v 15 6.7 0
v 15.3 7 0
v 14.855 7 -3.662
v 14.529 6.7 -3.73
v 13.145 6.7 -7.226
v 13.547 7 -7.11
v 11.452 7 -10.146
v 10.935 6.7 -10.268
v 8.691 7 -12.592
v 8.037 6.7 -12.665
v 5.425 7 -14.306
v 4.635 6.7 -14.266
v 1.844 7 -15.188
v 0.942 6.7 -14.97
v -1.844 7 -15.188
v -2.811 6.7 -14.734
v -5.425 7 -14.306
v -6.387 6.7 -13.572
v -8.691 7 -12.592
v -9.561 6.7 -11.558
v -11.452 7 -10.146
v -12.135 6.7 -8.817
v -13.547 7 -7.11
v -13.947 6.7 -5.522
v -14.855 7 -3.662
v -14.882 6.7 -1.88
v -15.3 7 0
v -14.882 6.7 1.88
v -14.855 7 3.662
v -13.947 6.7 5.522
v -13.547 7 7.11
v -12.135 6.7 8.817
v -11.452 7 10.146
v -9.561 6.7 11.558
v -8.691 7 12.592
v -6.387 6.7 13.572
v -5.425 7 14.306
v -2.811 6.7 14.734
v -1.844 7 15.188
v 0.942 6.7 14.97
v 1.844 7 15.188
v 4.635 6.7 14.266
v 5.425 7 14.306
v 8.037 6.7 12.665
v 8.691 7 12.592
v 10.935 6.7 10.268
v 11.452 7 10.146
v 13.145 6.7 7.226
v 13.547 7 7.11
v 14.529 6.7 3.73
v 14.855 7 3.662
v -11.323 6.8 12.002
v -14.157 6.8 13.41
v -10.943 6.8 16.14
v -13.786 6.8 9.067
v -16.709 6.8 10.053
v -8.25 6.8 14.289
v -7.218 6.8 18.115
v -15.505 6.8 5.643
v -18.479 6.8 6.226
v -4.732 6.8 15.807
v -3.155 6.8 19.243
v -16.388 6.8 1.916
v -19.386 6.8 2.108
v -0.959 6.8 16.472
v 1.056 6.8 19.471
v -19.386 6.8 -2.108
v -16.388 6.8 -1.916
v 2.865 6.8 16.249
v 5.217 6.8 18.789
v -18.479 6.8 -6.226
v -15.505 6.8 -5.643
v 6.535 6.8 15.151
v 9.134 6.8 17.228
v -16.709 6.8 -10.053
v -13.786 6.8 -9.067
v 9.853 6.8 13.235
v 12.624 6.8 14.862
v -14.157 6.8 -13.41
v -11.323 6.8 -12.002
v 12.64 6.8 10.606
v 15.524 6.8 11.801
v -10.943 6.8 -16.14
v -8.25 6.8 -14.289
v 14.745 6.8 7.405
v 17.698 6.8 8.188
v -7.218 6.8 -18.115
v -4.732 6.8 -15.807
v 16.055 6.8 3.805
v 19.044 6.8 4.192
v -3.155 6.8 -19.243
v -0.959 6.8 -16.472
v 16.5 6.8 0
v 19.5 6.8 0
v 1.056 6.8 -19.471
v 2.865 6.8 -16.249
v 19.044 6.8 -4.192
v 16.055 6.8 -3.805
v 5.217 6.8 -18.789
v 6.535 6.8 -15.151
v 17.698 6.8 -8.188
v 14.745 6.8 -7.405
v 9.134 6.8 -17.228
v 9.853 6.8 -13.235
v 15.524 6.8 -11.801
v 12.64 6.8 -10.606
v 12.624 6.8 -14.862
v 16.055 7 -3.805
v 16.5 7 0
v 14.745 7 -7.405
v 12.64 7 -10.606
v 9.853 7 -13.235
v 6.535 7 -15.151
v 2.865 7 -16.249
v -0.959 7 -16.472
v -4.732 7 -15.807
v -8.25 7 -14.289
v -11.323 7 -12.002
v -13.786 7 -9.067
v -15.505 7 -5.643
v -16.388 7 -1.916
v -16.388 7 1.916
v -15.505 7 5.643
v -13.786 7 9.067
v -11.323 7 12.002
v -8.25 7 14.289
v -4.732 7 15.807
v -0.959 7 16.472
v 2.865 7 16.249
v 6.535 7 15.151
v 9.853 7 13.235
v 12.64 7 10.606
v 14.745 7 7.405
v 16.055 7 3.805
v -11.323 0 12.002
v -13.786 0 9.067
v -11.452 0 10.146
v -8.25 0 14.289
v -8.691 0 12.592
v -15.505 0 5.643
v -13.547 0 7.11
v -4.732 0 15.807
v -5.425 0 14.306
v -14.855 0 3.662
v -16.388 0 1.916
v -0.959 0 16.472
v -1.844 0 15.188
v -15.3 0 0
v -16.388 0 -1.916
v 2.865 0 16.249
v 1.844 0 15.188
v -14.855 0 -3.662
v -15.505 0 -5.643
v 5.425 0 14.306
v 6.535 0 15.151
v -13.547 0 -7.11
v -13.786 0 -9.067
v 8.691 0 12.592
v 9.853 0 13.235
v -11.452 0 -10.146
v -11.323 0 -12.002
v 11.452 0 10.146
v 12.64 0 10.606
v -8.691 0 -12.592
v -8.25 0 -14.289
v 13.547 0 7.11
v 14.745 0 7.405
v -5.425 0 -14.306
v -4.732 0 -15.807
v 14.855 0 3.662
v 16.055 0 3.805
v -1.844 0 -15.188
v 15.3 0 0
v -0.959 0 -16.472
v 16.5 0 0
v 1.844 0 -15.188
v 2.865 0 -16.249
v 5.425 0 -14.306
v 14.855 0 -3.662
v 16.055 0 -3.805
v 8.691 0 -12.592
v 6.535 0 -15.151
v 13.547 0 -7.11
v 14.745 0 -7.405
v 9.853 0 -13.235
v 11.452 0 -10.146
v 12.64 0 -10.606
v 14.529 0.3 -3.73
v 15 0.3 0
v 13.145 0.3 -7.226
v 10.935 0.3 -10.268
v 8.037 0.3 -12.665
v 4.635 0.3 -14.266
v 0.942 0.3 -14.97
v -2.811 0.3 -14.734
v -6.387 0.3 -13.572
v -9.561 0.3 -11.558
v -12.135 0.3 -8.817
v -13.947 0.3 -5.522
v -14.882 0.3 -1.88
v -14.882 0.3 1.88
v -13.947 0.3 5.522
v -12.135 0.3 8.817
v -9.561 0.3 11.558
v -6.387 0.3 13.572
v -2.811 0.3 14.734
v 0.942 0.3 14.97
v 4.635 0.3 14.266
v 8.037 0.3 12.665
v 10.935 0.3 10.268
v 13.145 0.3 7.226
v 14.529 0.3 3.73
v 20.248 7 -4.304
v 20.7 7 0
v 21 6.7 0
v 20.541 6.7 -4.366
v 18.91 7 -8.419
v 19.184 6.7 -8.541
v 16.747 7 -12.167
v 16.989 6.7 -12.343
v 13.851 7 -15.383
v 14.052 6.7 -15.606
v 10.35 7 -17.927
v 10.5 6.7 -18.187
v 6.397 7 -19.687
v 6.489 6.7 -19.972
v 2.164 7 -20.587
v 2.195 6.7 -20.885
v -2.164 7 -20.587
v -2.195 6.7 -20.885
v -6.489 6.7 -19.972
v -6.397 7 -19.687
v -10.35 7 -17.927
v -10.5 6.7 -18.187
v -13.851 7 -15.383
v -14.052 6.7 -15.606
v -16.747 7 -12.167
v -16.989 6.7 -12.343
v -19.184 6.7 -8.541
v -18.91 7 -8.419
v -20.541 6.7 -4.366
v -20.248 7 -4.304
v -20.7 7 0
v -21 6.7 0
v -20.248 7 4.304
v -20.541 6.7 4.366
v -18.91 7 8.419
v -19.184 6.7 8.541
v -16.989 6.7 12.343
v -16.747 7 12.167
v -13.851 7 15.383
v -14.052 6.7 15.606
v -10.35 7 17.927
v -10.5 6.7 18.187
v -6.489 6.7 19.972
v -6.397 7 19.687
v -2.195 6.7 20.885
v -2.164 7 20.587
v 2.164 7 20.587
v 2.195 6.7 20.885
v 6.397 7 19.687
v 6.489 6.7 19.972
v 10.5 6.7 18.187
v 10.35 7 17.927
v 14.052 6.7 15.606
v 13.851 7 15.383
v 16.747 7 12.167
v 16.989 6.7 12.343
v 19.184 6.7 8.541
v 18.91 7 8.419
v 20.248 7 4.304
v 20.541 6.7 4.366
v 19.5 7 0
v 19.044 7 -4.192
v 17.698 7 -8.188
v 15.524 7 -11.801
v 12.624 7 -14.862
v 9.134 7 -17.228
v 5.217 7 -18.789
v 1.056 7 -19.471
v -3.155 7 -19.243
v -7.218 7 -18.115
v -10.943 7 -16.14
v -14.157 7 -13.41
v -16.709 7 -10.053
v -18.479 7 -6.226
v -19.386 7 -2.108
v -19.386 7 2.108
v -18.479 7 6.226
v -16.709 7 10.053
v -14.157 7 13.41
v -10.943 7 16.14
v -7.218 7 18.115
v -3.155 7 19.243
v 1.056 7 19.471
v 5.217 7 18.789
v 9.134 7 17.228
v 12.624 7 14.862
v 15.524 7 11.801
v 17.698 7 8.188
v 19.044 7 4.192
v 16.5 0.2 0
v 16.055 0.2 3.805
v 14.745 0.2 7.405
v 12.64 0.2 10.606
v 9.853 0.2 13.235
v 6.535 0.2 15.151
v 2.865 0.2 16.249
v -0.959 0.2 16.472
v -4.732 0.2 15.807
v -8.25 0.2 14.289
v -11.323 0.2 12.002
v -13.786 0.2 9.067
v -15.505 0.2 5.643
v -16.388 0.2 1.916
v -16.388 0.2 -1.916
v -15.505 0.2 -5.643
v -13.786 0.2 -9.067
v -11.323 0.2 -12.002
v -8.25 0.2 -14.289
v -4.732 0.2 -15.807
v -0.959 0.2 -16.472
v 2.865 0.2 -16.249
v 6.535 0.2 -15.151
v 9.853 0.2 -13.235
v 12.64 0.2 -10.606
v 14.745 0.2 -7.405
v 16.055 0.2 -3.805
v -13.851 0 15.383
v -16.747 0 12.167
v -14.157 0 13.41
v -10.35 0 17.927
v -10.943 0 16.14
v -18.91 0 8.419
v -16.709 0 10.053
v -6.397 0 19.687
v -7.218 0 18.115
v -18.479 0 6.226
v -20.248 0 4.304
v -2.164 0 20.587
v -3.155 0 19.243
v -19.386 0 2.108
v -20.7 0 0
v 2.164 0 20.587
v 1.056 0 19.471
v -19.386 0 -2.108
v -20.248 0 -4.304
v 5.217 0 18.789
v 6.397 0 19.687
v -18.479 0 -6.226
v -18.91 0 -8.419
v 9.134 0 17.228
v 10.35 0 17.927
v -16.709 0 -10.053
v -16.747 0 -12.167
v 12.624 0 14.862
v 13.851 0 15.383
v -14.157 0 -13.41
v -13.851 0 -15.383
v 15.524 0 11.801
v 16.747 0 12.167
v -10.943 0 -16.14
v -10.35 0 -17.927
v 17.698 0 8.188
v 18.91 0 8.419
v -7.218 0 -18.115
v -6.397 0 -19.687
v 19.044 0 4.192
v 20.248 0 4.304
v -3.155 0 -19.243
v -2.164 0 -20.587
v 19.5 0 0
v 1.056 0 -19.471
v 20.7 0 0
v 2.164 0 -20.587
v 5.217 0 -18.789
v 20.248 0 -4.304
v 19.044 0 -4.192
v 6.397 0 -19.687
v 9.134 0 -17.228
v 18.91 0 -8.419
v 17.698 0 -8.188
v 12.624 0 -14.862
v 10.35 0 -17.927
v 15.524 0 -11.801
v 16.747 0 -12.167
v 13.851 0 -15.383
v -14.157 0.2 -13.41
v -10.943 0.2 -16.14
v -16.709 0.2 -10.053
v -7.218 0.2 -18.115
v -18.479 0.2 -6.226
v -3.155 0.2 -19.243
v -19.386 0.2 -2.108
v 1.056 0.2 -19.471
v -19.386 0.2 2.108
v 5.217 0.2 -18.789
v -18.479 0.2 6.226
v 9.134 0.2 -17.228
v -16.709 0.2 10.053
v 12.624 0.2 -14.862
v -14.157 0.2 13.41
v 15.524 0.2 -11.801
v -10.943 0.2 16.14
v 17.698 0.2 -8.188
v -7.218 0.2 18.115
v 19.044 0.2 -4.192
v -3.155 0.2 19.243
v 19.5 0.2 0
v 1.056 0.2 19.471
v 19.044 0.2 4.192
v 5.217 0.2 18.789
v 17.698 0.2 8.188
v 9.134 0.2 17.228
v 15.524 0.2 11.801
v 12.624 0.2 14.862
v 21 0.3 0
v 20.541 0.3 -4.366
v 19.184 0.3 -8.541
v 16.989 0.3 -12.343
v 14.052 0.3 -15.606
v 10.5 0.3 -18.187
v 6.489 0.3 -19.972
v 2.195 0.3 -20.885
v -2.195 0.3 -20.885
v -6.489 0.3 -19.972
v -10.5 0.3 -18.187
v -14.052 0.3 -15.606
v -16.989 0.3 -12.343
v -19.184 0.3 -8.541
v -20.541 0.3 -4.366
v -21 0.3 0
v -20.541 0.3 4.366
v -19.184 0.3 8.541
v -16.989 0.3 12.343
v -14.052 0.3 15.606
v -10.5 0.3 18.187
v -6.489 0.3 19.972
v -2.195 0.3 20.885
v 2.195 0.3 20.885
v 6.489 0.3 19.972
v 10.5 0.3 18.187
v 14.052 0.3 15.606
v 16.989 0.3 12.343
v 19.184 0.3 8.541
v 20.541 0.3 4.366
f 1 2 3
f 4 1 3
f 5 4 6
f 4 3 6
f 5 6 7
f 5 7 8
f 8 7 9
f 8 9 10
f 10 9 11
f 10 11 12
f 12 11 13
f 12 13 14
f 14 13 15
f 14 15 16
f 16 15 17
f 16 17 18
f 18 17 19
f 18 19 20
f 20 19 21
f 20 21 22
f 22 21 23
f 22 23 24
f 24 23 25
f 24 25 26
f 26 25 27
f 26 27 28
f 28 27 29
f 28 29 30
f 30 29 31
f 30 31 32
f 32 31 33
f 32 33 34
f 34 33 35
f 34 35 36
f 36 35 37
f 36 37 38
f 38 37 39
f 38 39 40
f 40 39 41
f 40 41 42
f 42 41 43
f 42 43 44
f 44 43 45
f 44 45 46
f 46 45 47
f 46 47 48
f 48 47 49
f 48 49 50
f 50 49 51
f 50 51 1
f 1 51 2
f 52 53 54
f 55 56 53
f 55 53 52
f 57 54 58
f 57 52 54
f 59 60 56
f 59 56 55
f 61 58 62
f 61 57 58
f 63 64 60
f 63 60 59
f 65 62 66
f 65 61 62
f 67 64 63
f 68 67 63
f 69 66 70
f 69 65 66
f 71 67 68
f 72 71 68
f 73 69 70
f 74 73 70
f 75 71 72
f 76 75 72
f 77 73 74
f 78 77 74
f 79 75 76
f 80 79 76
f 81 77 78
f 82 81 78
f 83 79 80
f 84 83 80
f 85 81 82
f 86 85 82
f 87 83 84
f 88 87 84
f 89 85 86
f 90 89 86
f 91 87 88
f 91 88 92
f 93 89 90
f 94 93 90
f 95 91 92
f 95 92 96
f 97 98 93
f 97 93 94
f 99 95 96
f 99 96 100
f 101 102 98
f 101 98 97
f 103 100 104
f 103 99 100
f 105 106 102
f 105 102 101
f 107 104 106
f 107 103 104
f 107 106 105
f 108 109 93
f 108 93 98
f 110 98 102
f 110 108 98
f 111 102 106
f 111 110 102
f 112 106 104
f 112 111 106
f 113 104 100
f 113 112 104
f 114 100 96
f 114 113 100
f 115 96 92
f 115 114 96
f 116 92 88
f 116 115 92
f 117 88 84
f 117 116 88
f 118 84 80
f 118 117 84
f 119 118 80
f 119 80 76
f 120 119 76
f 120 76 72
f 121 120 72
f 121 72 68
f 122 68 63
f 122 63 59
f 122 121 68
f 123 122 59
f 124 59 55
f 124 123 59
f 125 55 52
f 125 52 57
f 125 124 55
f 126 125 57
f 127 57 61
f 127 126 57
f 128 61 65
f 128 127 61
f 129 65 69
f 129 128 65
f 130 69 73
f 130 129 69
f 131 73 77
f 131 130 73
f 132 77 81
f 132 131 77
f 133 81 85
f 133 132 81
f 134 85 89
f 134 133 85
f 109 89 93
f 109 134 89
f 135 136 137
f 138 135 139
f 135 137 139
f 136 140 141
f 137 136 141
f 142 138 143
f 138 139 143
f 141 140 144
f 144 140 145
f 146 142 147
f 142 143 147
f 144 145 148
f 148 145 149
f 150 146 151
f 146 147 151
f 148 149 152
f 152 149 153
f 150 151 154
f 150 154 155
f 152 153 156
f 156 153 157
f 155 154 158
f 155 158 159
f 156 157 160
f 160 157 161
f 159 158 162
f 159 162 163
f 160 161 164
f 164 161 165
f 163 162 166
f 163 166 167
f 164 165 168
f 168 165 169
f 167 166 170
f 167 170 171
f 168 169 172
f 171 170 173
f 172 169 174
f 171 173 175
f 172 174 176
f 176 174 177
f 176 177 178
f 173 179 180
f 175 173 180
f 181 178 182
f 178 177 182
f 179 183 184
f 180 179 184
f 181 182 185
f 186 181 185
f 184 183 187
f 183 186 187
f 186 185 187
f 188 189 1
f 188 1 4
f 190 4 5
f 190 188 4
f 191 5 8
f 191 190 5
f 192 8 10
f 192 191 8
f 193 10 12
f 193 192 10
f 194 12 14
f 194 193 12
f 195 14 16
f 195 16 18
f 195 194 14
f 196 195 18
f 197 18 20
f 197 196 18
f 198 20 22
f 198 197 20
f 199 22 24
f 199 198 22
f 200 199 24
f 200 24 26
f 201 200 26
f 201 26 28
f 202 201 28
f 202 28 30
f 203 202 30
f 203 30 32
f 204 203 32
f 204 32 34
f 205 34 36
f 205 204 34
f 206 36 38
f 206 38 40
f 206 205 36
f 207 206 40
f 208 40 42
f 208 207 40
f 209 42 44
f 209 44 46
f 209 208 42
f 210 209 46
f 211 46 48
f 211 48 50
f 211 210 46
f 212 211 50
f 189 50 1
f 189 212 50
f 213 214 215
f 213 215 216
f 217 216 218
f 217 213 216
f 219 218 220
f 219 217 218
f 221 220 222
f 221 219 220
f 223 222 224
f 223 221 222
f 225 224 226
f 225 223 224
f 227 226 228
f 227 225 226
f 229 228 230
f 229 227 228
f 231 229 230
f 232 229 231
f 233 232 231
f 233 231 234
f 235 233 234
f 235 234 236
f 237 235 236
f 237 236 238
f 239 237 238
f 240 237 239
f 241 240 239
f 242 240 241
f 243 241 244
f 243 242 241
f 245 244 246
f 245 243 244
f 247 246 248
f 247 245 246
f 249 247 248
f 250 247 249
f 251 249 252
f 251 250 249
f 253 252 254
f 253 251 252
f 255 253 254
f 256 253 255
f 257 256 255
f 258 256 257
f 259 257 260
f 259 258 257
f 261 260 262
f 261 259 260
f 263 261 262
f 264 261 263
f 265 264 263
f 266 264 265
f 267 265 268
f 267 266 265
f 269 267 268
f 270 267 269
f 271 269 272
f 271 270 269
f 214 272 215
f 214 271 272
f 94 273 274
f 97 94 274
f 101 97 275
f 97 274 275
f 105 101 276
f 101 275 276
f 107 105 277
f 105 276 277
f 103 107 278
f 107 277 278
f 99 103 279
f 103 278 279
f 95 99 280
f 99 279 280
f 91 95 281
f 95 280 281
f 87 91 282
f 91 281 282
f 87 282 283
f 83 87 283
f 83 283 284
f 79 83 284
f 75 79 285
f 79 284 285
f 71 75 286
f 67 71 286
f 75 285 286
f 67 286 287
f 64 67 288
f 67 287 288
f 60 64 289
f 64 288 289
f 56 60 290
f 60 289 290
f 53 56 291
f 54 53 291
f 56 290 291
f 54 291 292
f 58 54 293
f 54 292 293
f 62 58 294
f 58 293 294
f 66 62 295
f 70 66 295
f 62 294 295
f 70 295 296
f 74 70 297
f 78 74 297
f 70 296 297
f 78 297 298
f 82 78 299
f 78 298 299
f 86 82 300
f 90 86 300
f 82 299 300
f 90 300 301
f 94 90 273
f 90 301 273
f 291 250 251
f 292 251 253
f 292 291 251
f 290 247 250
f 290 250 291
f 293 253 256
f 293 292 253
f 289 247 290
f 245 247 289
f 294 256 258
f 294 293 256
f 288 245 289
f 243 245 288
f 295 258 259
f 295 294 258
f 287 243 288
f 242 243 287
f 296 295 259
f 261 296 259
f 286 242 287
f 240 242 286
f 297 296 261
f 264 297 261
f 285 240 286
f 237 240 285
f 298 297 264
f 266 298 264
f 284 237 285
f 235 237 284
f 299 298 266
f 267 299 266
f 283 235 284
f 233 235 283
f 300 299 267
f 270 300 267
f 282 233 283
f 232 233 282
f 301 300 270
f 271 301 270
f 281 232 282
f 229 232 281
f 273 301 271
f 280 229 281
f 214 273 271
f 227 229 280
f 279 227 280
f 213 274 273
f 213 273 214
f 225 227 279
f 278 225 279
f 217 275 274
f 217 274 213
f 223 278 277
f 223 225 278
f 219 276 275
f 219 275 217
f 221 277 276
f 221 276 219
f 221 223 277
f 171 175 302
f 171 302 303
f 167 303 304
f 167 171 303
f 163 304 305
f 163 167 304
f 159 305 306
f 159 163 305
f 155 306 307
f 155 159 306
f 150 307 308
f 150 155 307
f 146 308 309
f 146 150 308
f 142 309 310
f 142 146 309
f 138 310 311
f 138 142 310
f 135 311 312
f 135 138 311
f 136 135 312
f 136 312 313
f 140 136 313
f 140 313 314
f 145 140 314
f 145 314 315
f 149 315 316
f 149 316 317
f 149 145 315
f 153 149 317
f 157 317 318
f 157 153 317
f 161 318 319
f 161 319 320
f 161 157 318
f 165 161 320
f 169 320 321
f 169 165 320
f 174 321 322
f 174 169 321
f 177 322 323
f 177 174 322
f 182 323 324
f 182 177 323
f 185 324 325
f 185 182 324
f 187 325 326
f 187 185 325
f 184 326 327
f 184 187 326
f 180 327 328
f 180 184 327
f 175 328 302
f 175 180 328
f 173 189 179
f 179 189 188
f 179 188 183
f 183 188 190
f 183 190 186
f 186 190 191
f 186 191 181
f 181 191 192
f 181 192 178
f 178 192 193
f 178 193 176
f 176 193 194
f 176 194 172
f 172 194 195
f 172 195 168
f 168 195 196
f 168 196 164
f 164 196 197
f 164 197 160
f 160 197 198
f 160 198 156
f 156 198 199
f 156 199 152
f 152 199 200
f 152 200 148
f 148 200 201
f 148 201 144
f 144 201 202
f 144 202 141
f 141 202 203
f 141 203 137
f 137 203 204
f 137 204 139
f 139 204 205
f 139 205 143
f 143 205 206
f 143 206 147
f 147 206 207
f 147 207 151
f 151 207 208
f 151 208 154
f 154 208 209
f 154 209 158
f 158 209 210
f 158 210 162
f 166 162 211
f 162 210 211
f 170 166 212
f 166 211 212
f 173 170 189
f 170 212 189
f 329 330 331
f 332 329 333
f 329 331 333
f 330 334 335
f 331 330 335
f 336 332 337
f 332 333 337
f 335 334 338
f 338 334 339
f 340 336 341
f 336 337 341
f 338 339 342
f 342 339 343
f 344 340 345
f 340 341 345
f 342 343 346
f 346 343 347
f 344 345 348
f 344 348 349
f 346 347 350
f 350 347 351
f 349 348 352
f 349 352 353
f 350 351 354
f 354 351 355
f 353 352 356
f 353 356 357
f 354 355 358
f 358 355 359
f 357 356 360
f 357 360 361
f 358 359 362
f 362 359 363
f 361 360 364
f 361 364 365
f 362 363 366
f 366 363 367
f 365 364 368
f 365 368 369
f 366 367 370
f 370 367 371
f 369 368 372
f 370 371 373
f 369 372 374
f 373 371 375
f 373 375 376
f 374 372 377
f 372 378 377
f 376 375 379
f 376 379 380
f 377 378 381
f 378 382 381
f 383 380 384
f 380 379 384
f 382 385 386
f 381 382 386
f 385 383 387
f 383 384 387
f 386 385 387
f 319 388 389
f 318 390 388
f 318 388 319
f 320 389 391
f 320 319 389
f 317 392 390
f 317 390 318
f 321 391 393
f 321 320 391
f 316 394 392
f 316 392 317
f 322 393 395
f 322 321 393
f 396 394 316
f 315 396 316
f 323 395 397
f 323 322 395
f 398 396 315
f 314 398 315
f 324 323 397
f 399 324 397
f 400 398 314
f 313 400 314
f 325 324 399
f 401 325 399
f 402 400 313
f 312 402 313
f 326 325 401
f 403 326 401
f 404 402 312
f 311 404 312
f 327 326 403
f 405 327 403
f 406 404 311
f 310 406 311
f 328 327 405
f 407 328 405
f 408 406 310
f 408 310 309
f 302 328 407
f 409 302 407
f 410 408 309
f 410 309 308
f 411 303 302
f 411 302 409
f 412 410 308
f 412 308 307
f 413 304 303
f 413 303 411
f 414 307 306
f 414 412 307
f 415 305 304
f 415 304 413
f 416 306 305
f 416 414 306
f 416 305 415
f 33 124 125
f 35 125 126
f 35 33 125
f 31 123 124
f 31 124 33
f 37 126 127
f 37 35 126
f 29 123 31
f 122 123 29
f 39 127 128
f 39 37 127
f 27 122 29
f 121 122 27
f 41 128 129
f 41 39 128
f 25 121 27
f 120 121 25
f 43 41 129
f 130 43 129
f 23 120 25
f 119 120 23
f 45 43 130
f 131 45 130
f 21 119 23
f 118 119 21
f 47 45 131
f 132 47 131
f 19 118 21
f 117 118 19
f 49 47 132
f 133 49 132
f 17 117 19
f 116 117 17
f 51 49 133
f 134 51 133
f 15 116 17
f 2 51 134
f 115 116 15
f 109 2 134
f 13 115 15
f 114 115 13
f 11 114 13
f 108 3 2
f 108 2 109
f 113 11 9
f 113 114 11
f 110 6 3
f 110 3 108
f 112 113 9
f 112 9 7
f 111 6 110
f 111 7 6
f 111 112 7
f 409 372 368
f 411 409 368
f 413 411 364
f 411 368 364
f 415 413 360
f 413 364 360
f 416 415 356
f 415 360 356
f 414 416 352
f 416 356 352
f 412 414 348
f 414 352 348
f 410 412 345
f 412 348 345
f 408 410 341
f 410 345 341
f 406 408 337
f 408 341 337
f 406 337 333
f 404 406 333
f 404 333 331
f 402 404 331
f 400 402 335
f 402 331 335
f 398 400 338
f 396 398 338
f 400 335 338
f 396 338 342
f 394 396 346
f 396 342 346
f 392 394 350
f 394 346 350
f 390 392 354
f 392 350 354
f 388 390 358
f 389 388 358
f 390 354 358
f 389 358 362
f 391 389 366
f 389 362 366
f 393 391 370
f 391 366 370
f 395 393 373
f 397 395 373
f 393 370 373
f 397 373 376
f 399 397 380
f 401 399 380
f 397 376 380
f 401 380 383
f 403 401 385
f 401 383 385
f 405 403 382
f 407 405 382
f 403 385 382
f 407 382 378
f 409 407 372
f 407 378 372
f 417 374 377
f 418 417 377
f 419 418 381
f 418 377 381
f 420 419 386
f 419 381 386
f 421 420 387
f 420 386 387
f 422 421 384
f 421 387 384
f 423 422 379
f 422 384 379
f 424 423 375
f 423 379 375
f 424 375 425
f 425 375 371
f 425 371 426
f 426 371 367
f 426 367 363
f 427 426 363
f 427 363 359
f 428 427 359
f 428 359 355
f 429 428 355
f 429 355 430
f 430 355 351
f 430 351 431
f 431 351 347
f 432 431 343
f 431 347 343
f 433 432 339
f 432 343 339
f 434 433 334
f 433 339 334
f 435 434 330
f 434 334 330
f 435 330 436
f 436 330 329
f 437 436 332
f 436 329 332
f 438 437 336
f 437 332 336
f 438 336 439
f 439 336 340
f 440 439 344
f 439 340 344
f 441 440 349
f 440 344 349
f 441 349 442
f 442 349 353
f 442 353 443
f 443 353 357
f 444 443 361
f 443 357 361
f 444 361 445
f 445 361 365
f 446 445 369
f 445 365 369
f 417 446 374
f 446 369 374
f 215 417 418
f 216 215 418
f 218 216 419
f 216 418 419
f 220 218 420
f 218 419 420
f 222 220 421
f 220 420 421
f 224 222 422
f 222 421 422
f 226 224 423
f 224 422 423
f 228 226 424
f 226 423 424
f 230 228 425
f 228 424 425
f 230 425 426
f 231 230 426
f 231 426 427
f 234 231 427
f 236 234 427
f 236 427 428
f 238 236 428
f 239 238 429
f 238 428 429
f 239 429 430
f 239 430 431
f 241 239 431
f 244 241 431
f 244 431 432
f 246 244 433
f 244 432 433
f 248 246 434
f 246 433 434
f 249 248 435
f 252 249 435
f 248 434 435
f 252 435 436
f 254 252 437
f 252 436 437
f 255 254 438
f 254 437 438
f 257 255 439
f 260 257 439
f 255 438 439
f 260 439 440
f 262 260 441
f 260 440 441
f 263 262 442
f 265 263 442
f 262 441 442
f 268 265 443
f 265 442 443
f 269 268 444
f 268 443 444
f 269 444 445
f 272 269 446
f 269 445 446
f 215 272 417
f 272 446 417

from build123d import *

# Parameters (mm, degrees)
SKETCH1_R           = 21
SKETCH1_R_2         = 15
BOSS_EXTRUDE1_DEPTH = 7
SKETCH2_R           = 19.5
SKETCH2_R_2         = 16.5
CUT_EXTRUDE1_DEPTH  = 0.2
CHAMFER1_SIZE       = 0.3
SKETCH3_R           = 19.5
SKETCH3_R_2         = 16.5
CUT_EXTRUDE2_DEPTH  = 0.2


with BuildPart() as part:
    # Sketch1 → Boss-Extrude1 (new body)
    with BuildSketch(Plane(origin=(0, 0, 0), x_dir=(1, 0, 0), z_dir=(0, 1, 0))):
        Circle(SKETCH1_R)
        Circle(SKETCH1_R_2, mode=Mode.SUBTRACT)
    extrude(amount=BOSS_EXTRUDE1_DEPTH)

    # Sketch2 → Cut-Extrude1 (cut)
    with BuildSketch(Plane(origin=(0, 7, 0), x_dir=(1, 0, 0), z_dir=(0, 1, 0))):
        Circle(SKETCH2_R)
        Circle(SKETCH2_R_2, mode=Mode.SUBTRACT)
    extrude(amount=-CUT_EXTRUDE1_DEPTH, mode=Mode.SUBTRACT)

    # Chamfer1
    chamfer1_edges = [part.edges().sort_by_distance(p)[0] for p in [
        (-21, 0, 0),
        (-21, 7, 0),
        (-15, 0, 0),
        (-15, 7, 0),
    ]]
    chamfer(chamfer1_edges, length=CHAMFER1_SIZE)

    # Sketch3 → Cut-Extrude2 (cut)
    with BuildSketch(Plane.XZ):
        Circle(SKETCH3_R)
        Circle(SKETCH3_R_2, mode=Mode.SUBTRACT)
    extrude(amount=-CUT_EXTRUDE2_DEPTH, mode=Mode.SUBTRACT)


solid = part.part
